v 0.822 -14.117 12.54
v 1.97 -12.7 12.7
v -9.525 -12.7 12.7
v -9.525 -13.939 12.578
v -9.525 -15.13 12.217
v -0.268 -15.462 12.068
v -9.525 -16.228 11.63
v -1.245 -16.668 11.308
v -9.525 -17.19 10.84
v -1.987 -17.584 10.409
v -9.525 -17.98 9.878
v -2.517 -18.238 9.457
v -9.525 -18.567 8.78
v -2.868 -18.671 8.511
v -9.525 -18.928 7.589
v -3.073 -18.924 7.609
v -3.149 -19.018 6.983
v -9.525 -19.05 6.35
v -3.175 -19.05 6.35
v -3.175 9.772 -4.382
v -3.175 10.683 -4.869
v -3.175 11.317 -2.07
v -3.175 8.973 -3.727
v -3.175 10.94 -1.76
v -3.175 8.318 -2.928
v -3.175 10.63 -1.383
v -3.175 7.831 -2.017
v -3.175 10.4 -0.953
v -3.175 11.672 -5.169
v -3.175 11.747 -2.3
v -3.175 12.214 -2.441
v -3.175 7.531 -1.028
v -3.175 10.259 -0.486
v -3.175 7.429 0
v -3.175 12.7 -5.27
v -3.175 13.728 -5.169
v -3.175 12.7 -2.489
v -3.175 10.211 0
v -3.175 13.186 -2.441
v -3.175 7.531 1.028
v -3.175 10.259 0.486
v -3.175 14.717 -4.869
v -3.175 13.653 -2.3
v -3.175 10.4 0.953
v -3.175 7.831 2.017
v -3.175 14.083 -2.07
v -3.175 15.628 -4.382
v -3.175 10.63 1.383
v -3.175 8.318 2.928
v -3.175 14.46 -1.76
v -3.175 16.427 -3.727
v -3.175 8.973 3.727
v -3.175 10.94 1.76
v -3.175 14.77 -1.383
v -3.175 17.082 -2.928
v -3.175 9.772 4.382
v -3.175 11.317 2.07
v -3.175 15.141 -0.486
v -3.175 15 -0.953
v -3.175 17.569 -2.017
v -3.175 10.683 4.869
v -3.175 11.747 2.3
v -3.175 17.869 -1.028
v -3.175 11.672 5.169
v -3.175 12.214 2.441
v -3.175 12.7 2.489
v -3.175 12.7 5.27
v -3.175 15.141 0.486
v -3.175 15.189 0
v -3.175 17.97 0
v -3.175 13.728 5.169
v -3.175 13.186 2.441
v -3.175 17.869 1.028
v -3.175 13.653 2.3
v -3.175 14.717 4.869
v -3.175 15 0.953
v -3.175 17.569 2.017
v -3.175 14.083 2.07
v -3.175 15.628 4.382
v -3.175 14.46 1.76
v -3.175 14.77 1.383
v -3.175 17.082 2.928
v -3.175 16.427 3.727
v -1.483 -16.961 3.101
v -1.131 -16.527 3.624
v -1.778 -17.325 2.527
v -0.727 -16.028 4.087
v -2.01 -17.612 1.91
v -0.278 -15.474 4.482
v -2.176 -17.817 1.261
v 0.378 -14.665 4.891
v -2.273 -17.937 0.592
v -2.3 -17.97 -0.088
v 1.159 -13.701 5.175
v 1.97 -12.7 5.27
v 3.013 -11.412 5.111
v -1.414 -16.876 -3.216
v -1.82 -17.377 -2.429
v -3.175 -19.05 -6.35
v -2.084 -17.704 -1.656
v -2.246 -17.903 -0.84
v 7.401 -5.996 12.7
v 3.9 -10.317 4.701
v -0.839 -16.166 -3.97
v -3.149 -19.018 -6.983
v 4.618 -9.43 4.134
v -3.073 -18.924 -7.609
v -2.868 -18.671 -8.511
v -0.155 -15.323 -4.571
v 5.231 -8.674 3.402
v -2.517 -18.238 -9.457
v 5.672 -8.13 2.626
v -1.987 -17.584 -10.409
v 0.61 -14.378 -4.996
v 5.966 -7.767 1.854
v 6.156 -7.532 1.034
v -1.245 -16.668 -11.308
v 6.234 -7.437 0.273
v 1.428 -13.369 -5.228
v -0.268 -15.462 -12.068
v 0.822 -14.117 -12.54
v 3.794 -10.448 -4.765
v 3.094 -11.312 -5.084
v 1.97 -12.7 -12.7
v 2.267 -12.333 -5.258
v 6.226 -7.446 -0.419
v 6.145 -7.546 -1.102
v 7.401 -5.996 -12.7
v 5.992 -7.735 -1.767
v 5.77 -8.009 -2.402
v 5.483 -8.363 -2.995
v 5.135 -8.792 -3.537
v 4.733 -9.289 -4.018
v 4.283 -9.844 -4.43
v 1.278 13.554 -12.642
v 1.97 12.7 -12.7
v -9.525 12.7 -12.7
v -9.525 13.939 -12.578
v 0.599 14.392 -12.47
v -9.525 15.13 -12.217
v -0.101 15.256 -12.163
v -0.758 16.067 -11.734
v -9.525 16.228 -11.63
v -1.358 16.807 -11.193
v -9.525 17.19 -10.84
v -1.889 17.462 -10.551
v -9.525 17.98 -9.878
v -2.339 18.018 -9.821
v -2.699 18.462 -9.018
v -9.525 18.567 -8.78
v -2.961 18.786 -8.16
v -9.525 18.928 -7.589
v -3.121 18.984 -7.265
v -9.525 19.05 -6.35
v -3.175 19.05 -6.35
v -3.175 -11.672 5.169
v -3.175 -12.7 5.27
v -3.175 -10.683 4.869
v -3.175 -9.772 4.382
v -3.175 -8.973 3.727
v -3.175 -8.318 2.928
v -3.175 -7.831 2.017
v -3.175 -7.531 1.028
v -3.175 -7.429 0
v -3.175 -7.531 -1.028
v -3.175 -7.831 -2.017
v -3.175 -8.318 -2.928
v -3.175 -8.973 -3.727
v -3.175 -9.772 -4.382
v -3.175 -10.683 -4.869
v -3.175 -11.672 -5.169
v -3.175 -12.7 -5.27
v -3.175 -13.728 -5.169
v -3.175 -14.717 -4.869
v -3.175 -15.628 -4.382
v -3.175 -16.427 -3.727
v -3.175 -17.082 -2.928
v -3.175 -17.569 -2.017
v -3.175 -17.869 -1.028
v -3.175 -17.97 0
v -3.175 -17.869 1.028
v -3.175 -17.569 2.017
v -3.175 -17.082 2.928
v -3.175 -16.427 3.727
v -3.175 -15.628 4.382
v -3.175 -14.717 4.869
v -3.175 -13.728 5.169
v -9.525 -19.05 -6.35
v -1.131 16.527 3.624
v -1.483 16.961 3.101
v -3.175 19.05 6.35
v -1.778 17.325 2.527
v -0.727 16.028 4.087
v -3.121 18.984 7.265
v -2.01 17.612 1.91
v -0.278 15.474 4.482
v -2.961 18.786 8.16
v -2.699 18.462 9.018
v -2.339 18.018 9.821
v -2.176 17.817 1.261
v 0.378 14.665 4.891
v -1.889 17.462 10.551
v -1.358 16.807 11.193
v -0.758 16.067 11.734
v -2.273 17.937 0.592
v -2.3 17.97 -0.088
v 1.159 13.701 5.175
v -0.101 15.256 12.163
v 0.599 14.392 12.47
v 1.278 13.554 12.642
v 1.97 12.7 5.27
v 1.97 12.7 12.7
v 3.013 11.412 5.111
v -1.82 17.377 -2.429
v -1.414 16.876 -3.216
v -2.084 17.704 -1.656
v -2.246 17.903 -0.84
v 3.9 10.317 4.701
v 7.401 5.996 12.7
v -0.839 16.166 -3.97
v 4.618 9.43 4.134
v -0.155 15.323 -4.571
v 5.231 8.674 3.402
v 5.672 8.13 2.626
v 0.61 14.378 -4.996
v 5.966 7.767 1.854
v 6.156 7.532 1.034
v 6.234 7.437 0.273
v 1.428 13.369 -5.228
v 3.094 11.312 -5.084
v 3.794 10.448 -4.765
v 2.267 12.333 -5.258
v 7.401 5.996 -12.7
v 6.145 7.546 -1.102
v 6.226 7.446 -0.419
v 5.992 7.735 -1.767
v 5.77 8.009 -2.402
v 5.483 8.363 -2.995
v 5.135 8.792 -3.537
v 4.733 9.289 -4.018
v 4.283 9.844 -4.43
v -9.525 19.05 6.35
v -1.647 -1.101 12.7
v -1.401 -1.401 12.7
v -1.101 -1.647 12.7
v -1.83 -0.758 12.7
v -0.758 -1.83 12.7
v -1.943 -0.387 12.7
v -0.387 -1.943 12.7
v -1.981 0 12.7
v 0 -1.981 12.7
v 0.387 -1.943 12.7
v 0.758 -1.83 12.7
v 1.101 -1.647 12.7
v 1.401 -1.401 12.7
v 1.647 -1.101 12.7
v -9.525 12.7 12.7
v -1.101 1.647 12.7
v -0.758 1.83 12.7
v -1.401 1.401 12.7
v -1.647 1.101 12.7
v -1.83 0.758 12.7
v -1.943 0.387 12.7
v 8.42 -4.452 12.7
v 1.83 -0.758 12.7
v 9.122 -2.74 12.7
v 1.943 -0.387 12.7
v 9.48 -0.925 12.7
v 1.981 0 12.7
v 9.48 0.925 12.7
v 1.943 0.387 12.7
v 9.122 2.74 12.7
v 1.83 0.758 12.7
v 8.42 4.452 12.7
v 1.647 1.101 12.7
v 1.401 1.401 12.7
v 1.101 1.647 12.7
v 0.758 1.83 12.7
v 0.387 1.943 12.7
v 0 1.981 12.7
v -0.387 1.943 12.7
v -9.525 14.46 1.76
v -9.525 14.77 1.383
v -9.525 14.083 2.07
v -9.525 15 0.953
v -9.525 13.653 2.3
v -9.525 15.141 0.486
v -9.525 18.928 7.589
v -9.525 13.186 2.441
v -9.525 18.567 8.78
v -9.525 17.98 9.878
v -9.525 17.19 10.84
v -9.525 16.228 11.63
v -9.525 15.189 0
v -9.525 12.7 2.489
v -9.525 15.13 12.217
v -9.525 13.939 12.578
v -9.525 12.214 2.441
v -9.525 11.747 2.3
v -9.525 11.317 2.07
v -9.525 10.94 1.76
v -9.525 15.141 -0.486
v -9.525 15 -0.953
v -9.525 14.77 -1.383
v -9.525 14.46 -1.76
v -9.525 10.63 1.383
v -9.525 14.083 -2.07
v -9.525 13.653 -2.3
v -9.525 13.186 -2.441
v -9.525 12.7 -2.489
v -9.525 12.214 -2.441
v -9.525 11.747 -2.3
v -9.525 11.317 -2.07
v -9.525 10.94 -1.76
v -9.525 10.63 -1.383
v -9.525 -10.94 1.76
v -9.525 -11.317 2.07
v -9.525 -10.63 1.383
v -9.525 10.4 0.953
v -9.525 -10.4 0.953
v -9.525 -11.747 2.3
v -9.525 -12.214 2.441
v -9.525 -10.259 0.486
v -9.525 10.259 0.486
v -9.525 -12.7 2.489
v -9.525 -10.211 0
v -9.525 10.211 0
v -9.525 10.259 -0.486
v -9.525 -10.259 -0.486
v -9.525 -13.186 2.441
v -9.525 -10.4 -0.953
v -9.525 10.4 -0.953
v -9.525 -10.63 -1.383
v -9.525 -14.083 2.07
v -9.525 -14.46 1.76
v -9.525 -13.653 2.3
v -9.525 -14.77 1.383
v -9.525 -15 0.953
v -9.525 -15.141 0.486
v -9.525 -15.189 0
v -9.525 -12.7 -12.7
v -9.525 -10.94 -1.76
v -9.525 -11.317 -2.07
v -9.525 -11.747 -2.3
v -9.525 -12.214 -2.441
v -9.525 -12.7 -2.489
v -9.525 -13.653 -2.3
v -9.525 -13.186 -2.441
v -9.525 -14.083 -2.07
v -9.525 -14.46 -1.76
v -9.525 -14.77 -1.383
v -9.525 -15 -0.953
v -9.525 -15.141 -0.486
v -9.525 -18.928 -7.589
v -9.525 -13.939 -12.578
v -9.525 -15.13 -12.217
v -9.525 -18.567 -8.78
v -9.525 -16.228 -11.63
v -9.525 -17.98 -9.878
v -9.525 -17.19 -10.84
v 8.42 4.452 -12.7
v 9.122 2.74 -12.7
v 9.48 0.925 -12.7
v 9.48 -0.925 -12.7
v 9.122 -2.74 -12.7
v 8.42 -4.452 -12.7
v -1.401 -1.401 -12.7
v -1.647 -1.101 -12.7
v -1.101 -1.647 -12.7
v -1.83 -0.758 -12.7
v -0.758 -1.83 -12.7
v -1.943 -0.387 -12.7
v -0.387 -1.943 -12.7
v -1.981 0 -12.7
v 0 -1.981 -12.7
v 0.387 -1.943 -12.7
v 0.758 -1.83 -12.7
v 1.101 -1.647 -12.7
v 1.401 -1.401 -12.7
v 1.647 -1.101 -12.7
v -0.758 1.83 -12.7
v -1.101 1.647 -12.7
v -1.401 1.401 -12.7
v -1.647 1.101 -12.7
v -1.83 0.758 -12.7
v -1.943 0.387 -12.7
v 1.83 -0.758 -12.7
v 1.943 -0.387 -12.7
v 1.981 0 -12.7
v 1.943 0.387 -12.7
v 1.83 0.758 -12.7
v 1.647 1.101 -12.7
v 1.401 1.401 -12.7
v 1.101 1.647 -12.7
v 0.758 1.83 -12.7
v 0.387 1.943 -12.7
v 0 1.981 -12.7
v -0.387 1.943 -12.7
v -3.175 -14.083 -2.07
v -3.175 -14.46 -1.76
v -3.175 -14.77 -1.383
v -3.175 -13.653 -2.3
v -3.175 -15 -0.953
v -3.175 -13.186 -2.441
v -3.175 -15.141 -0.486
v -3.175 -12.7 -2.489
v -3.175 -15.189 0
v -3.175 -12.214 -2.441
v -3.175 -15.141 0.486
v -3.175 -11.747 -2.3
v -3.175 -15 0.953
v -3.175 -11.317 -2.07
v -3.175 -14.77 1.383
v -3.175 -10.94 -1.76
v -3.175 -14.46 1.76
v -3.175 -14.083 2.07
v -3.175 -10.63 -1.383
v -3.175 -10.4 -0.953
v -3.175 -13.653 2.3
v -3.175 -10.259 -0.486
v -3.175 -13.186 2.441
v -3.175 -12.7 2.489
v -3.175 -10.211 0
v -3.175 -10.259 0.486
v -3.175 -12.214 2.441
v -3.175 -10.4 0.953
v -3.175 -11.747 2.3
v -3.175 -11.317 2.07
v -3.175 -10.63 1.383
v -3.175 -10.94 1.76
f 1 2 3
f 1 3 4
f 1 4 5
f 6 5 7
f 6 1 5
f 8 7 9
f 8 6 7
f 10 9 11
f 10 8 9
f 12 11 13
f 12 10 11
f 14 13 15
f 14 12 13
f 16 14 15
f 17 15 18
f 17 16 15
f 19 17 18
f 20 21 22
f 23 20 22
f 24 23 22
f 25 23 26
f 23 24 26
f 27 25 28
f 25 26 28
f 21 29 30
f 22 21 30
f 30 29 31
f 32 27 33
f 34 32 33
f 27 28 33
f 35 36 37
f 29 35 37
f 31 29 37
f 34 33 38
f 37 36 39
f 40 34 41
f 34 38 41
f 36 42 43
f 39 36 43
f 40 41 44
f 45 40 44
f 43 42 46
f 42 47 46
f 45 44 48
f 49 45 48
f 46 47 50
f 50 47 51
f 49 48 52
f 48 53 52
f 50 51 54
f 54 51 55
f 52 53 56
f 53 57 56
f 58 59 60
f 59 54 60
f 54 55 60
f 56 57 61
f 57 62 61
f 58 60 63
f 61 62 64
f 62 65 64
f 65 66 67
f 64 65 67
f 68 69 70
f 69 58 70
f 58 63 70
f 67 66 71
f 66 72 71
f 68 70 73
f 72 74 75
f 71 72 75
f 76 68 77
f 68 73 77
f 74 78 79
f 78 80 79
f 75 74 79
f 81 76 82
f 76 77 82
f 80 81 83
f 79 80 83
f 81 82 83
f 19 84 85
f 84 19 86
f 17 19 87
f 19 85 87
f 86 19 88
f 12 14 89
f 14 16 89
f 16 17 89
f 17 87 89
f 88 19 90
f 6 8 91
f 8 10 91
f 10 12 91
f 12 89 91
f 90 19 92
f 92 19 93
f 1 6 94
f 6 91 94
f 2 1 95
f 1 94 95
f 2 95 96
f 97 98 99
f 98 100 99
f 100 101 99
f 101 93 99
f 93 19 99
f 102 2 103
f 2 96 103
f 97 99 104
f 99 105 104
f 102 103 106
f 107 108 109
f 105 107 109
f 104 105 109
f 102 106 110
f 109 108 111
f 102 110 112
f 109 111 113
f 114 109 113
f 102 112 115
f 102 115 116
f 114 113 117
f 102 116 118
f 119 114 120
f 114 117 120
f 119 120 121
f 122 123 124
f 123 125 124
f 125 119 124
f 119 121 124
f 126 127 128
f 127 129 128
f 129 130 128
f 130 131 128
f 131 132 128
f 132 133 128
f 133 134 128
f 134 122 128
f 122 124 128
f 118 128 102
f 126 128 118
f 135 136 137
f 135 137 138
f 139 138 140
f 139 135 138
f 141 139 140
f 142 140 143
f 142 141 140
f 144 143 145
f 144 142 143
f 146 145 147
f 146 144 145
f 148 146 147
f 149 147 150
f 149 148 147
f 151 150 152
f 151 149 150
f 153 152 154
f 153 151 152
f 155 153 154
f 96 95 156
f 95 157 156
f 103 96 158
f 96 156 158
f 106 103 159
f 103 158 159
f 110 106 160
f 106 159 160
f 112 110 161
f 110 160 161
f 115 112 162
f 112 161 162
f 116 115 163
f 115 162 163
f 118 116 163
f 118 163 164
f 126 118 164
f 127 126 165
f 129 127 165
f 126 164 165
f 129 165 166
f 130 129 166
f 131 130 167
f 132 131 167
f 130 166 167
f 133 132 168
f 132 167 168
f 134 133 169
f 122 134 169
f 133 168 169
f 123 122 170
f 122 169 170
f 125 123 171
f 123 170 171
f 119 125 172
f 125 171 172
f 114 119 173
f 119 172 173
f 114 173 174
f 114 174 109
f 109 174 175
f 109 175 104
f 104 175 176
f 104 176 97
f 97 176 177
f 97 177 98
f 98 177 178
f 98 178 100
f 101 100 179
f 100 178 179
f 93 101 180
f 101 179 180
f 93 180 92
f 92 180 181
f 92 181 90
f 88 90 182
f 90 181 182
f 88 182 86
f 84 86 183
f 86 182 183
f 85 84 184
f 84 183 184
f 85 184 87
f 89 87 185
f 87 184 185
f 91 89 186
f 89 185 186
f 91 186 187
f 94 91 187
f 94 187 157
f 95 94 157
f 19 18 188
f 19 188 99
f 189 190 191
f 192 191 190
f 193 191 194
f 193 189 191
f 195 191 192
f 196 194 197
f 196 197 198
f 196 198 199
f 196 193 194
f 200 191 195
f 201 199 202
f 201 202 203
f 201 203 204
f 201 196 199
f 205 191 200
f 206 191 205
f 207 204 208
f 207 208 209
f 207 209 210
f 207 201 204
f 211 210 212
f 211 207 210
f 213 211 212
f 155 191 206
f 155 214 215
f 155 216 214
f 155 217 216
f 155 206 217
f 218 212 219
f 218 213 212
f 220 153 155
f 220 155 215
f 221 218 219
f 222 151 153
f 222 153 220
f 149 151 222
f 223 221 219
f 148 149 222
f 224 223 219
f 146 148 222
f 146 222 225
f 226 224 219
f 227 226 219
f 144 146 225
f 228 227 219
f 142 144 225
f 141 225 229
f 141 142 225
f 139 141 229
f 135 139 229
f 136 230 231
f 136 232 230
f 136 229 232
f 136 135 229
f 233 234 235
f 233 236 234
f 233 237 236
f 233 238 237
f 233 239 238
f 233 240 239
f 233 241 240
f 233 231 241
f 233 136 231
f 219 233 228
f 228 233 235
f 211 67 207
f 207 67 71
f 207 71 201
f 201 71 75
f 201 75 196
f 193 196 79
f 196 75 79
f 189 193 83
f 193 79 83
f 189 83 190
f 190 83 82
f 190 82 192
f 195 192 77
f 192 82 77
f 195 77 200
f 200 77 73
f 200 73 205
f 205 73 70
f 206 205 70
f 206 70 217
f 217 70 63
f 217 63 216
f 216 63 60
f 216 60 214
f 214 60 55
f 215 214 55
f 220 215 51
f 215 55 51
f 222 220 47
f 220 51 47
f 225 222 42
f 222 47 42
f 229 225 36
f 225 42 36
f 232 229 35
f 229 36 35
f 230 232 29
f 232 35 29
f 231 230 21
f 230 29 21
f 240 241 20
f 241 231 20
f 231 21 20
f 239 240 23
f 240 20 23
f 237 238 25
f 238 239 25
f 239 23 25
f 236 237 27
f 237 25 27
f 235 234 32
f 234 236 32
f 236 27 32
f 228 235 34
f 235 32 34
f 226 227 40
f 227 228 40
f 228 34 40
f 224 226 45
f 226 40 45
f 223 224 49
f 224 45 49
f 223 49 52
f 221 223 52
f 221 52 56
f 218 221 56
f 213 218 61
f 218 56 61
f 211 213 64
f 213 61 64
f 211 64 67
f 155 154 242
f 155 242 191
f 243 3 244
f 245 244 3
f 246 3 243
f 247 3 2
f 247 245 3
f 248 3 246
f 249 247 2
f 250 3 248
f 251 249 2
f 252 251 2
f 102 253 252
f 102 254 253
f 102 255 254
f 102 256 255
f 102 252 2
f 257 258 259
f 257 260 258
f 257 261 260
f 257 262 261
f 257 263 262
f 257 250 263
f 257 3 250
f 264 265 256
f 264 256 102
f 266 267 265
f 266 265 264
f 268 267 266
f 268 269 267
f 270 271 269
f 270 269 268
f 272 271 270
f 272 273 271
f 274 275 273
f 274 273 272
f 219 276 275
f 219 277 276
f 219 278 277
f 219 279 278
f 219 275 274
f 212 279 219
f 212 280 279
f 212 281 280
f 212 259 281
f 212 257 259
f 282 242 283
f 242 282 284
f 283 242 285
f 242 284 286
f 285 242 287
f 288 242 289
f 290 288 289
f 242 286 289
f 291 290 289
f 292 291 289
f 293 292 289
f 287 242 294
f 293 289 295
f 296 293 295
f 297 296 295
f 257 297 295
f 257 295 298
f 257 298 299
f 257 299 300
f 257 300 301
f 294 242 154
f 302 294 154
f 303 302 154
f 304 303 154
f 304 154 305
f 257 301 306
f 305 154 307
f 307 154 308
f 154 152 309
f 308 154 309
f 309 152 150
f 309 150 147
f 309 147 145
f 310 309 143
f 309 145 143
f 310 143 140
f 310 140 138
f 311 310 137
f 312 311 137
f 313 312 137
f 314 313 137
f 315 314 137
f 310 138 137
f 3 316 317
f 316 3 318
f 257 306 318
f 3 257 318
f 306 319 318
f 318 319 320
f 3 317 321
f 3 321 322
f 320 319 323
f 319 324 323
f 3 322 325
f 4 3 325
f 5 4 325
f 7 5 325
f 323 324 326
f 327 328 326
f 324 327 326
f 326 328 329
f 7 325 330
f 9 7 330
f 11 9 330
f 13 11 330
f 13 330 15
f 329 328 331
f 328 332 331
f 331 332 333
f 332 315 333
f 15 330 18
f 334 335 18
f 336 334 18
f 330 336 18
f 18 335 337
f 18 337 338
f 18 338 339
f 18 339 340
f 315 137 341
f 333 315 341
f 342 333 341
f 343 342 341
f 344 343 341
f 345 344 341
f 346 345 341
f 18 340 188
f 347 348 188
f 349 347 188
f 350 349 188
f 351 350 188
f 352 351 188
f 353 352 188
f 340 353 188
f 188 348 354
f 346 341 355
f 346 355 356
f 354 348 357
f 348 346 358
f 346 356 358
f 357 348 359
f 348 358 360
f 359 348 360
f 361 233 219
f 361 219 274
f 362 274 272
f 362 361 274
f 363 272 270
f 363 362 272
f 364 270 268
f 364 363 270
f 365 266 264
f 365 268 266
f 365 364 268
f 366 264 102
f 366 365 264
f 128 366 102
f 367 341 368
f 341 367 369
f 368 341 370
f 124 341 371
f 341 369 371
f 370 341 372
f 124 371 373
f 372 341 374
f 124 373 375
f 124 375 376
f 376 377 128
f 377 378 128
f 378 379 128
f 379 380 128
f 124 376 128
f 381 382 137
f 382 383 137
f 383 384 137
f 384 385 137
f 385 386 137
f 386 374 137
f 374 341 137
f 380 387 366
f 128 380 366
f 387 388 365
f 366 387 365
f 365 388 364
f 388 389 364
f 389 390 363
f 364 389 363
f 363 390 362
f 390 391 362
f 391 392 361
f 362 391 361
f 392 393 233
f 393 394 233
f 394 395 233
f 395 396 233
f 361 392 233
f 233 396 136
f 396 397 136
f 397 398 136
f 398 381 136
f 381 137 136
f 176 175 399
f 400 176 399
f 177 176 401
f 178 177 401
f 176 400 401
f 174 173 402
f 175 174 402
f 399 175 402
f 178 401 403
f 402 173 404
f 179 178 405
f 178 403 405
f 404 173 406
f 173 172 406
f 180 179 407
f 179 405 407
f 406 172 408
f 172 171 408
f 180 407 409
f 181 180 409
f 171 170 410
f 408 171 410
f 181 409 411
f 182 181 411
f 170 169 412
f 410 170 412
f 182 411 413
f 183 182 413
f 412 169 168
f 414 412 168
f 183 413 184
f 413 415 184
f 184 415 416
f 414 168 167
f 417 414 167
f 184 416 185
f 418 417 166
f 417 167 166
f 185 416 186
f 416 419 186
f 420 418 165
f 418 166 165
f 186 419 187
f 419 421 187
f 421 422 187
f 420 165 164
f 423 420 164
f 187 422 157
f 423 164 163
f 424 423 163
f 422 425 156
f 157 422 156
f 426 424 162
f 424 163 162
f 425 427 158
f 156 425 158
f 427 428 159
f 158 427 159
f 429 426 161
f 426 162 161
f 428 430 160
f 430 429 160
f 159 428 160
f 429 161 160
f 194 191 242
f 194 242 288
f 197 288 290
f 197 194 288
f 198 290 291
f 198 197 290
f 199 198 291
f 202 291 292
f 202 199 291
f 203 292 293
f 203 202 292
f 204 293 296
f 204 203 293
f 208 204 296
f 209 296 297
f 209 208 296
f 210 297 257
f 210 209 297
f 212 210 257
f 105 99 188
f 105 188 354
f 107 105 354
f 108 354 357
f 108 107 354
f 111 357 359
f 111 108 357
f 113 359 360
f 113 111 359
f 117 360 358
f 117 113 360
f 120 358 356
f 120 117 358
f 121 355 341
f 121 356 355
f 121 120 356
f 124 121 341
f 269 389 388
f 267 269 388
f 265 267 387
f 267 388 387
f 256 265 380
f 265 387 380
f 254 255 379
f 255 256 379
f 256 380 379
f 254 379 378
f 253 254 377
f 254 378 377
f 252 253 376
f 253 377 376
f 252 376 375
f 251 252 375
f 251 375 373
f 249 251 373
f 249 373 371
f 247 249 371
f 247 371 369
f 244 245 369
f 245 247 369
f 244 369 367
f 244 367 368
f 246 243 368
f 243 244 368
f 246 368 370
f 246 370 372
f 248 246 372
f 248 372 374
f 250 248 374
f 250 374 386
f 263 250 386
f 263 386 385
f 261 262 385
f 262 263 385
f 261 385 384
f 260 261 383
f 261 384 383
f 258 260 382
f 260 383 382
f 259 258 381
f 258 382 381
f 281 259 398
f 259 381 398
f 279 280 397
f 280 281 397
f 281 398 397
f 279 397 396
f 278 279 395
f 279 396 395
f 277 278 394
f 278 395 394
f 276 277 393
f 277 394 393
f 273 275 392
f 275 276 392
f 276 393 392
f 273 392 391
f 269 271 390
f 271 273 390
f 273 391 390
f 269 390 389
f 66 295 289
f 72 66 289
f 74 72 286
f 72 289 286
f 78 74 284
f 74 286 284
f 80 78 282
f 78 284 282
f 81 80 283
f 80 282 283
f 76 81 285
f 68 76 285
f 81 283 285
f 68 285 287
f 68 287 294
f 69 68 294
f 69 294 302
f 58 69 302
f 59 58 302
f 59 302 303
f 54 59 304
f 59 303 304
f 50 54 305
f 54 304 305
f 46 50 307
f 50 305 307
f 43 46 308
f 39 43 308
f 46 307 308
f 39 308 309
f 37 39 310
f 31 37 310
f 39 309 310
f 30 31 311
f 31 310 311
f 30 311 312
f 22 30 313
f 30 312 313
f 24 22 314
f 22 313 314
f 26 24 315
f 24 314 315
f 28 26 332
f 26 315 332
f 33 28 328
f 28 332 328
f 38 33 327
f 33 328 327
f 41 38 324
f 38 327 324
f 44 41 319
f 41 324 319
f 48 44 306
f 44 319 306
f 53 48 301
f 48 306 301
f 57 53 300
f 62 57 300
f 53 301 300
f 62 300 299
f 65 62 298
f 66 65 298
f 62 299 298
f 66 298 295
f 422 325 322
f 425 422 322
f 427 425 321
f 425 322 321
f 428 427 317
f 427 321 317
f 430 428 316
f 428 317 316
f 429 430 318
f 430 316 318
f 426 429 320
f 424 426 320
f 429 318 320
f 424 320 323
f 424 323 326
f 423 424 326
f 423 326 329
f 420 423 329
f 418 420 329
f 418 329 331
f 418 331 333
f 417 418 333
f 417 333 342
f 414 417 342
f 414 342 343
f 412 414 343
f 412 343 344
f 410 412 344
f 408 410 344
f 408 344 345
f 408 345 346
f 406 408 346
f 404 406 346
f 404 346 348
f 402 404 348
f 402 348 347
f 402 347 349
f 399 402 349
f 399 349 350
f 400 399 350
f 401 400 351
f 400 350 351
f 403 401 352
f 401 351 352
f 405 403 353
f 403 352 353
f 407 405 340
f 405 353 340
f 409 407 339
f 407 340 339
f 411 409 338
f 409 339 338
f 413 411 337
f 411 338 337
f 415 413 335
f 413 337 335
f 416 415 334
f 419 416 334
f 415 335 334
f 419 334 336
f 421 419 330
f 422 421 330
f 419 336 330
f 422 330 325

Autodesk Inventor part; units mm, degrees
ref_plane "YZ Plane" through (0, 0, 0) normal (1, 0, 0) x (0, 1, 0)
ref_plane "XZ Plane" through (0, 0, 0) normal (0, 1, 0) x (-1, 0, 0)
sketch "Sketch1" plane through (0, 0, 0) normal (0, 0, 1) x (1, 0, 0)
  circle A0 centre (0, 0) radius 9.525 construction
  circle A1 centre (0, 0) radius 1.9812
  line L0 (-9.525, 19.05) -> (-9.525, -19.05)
  line L1 (-9.525, 19.05) -> (-3.175, 19.05)
  line L2 (-3.175, 19.05) -> (7.4009, 5.996)
  line L3 (-9.525, -19.05) -> (-3.175, -19.05)
  line L4 (-3.175, -19.05) -> (7.4009, -5.996)
  arc A2 (7.4009, -5.996) -> (7.4009, 5.996) centre (0, 0) ccw
  point P0 (-9.525, 0)
  dimension "d0" = 19.05
  dimension "d1" = 3.9624
  dimension "d3" = 38.1
  dimension "d17" = 6.35
  dimension "d26" = 9.525
extrude "Extrusion1" add sketch "Sketch1" along normal mid plane 25.4
sketch "Sketch2" plane through (-9.525, -19.05, 12.7) normal (-1, 0, 0) x (0, 0, 1)
  circle A0 centre (-12.7, 19.05) radius 2.4892 construction
  line L0 (-25.4, 0) -> (-25.4, 38.1) projected
  circle A1 centre (-12.7, 31.75) radius 2.4892
  circle A2 centre (-12.7, 6.35) radius 2.4892
  circle A3 centre (-12.7, 19.05) radius 2.4892 construction
  dimension "d6" = 4.9784
  dimension "d9" = 12.7
  dimension "d12" = 12.7
extrude "Extrusion2" cut sketch "Sketch2" against normal through all
ref_plane "Work Plane1" through (-3.175, -19.05, 12.7) normal (-1, 0, 0) x (0, 0, 1)
sketch "Sketch3" plane through (-3.175, -19.05, 12.7) normal (-1, 0, 0) x (0, 0, 1)
  circle A0 centre (-12.7, 31.75) radius 2.4892 projected
  circle A1 centre (-12.7, 6.35) radius 2.4892 projected
  circle A2 centre (-12.7, 31.75) radius 5.2705
  circle A3 centre (-12.7, 6.35) radius 5.2705
  point P0 (-12.7, 19.05)
  dimension "d18" = 10.541
  dimension "d19" = 10.541
extrude "Extrusion3" cut sketch "Sketch3" against normal through all
thread "Thread1" size "10-24 UNC" class "2B" standard "ANSI Unified Screw Threads" length 25.4
fillet "Fillet1" radius 6.35 4 edges at (-6.35, 19.05, 12.7) (-6.35, 19.05, -12.7) (-6.35, -19.05, 12.7) (-6.35, -19.05, -12.7)
sketch "Sketch5" plane through (0, 0, -12.7) normal (0, 0, -1) x (-1, 0, 0)
  circle A0 centre (0, 0) radius 1.9812 projected
extrude "Extrusion5" [suppressed]
equation "\"d19\" = d18"
properties part number "F4C9-200-002 Side Bearing Block" material "Aluminum 6061"
